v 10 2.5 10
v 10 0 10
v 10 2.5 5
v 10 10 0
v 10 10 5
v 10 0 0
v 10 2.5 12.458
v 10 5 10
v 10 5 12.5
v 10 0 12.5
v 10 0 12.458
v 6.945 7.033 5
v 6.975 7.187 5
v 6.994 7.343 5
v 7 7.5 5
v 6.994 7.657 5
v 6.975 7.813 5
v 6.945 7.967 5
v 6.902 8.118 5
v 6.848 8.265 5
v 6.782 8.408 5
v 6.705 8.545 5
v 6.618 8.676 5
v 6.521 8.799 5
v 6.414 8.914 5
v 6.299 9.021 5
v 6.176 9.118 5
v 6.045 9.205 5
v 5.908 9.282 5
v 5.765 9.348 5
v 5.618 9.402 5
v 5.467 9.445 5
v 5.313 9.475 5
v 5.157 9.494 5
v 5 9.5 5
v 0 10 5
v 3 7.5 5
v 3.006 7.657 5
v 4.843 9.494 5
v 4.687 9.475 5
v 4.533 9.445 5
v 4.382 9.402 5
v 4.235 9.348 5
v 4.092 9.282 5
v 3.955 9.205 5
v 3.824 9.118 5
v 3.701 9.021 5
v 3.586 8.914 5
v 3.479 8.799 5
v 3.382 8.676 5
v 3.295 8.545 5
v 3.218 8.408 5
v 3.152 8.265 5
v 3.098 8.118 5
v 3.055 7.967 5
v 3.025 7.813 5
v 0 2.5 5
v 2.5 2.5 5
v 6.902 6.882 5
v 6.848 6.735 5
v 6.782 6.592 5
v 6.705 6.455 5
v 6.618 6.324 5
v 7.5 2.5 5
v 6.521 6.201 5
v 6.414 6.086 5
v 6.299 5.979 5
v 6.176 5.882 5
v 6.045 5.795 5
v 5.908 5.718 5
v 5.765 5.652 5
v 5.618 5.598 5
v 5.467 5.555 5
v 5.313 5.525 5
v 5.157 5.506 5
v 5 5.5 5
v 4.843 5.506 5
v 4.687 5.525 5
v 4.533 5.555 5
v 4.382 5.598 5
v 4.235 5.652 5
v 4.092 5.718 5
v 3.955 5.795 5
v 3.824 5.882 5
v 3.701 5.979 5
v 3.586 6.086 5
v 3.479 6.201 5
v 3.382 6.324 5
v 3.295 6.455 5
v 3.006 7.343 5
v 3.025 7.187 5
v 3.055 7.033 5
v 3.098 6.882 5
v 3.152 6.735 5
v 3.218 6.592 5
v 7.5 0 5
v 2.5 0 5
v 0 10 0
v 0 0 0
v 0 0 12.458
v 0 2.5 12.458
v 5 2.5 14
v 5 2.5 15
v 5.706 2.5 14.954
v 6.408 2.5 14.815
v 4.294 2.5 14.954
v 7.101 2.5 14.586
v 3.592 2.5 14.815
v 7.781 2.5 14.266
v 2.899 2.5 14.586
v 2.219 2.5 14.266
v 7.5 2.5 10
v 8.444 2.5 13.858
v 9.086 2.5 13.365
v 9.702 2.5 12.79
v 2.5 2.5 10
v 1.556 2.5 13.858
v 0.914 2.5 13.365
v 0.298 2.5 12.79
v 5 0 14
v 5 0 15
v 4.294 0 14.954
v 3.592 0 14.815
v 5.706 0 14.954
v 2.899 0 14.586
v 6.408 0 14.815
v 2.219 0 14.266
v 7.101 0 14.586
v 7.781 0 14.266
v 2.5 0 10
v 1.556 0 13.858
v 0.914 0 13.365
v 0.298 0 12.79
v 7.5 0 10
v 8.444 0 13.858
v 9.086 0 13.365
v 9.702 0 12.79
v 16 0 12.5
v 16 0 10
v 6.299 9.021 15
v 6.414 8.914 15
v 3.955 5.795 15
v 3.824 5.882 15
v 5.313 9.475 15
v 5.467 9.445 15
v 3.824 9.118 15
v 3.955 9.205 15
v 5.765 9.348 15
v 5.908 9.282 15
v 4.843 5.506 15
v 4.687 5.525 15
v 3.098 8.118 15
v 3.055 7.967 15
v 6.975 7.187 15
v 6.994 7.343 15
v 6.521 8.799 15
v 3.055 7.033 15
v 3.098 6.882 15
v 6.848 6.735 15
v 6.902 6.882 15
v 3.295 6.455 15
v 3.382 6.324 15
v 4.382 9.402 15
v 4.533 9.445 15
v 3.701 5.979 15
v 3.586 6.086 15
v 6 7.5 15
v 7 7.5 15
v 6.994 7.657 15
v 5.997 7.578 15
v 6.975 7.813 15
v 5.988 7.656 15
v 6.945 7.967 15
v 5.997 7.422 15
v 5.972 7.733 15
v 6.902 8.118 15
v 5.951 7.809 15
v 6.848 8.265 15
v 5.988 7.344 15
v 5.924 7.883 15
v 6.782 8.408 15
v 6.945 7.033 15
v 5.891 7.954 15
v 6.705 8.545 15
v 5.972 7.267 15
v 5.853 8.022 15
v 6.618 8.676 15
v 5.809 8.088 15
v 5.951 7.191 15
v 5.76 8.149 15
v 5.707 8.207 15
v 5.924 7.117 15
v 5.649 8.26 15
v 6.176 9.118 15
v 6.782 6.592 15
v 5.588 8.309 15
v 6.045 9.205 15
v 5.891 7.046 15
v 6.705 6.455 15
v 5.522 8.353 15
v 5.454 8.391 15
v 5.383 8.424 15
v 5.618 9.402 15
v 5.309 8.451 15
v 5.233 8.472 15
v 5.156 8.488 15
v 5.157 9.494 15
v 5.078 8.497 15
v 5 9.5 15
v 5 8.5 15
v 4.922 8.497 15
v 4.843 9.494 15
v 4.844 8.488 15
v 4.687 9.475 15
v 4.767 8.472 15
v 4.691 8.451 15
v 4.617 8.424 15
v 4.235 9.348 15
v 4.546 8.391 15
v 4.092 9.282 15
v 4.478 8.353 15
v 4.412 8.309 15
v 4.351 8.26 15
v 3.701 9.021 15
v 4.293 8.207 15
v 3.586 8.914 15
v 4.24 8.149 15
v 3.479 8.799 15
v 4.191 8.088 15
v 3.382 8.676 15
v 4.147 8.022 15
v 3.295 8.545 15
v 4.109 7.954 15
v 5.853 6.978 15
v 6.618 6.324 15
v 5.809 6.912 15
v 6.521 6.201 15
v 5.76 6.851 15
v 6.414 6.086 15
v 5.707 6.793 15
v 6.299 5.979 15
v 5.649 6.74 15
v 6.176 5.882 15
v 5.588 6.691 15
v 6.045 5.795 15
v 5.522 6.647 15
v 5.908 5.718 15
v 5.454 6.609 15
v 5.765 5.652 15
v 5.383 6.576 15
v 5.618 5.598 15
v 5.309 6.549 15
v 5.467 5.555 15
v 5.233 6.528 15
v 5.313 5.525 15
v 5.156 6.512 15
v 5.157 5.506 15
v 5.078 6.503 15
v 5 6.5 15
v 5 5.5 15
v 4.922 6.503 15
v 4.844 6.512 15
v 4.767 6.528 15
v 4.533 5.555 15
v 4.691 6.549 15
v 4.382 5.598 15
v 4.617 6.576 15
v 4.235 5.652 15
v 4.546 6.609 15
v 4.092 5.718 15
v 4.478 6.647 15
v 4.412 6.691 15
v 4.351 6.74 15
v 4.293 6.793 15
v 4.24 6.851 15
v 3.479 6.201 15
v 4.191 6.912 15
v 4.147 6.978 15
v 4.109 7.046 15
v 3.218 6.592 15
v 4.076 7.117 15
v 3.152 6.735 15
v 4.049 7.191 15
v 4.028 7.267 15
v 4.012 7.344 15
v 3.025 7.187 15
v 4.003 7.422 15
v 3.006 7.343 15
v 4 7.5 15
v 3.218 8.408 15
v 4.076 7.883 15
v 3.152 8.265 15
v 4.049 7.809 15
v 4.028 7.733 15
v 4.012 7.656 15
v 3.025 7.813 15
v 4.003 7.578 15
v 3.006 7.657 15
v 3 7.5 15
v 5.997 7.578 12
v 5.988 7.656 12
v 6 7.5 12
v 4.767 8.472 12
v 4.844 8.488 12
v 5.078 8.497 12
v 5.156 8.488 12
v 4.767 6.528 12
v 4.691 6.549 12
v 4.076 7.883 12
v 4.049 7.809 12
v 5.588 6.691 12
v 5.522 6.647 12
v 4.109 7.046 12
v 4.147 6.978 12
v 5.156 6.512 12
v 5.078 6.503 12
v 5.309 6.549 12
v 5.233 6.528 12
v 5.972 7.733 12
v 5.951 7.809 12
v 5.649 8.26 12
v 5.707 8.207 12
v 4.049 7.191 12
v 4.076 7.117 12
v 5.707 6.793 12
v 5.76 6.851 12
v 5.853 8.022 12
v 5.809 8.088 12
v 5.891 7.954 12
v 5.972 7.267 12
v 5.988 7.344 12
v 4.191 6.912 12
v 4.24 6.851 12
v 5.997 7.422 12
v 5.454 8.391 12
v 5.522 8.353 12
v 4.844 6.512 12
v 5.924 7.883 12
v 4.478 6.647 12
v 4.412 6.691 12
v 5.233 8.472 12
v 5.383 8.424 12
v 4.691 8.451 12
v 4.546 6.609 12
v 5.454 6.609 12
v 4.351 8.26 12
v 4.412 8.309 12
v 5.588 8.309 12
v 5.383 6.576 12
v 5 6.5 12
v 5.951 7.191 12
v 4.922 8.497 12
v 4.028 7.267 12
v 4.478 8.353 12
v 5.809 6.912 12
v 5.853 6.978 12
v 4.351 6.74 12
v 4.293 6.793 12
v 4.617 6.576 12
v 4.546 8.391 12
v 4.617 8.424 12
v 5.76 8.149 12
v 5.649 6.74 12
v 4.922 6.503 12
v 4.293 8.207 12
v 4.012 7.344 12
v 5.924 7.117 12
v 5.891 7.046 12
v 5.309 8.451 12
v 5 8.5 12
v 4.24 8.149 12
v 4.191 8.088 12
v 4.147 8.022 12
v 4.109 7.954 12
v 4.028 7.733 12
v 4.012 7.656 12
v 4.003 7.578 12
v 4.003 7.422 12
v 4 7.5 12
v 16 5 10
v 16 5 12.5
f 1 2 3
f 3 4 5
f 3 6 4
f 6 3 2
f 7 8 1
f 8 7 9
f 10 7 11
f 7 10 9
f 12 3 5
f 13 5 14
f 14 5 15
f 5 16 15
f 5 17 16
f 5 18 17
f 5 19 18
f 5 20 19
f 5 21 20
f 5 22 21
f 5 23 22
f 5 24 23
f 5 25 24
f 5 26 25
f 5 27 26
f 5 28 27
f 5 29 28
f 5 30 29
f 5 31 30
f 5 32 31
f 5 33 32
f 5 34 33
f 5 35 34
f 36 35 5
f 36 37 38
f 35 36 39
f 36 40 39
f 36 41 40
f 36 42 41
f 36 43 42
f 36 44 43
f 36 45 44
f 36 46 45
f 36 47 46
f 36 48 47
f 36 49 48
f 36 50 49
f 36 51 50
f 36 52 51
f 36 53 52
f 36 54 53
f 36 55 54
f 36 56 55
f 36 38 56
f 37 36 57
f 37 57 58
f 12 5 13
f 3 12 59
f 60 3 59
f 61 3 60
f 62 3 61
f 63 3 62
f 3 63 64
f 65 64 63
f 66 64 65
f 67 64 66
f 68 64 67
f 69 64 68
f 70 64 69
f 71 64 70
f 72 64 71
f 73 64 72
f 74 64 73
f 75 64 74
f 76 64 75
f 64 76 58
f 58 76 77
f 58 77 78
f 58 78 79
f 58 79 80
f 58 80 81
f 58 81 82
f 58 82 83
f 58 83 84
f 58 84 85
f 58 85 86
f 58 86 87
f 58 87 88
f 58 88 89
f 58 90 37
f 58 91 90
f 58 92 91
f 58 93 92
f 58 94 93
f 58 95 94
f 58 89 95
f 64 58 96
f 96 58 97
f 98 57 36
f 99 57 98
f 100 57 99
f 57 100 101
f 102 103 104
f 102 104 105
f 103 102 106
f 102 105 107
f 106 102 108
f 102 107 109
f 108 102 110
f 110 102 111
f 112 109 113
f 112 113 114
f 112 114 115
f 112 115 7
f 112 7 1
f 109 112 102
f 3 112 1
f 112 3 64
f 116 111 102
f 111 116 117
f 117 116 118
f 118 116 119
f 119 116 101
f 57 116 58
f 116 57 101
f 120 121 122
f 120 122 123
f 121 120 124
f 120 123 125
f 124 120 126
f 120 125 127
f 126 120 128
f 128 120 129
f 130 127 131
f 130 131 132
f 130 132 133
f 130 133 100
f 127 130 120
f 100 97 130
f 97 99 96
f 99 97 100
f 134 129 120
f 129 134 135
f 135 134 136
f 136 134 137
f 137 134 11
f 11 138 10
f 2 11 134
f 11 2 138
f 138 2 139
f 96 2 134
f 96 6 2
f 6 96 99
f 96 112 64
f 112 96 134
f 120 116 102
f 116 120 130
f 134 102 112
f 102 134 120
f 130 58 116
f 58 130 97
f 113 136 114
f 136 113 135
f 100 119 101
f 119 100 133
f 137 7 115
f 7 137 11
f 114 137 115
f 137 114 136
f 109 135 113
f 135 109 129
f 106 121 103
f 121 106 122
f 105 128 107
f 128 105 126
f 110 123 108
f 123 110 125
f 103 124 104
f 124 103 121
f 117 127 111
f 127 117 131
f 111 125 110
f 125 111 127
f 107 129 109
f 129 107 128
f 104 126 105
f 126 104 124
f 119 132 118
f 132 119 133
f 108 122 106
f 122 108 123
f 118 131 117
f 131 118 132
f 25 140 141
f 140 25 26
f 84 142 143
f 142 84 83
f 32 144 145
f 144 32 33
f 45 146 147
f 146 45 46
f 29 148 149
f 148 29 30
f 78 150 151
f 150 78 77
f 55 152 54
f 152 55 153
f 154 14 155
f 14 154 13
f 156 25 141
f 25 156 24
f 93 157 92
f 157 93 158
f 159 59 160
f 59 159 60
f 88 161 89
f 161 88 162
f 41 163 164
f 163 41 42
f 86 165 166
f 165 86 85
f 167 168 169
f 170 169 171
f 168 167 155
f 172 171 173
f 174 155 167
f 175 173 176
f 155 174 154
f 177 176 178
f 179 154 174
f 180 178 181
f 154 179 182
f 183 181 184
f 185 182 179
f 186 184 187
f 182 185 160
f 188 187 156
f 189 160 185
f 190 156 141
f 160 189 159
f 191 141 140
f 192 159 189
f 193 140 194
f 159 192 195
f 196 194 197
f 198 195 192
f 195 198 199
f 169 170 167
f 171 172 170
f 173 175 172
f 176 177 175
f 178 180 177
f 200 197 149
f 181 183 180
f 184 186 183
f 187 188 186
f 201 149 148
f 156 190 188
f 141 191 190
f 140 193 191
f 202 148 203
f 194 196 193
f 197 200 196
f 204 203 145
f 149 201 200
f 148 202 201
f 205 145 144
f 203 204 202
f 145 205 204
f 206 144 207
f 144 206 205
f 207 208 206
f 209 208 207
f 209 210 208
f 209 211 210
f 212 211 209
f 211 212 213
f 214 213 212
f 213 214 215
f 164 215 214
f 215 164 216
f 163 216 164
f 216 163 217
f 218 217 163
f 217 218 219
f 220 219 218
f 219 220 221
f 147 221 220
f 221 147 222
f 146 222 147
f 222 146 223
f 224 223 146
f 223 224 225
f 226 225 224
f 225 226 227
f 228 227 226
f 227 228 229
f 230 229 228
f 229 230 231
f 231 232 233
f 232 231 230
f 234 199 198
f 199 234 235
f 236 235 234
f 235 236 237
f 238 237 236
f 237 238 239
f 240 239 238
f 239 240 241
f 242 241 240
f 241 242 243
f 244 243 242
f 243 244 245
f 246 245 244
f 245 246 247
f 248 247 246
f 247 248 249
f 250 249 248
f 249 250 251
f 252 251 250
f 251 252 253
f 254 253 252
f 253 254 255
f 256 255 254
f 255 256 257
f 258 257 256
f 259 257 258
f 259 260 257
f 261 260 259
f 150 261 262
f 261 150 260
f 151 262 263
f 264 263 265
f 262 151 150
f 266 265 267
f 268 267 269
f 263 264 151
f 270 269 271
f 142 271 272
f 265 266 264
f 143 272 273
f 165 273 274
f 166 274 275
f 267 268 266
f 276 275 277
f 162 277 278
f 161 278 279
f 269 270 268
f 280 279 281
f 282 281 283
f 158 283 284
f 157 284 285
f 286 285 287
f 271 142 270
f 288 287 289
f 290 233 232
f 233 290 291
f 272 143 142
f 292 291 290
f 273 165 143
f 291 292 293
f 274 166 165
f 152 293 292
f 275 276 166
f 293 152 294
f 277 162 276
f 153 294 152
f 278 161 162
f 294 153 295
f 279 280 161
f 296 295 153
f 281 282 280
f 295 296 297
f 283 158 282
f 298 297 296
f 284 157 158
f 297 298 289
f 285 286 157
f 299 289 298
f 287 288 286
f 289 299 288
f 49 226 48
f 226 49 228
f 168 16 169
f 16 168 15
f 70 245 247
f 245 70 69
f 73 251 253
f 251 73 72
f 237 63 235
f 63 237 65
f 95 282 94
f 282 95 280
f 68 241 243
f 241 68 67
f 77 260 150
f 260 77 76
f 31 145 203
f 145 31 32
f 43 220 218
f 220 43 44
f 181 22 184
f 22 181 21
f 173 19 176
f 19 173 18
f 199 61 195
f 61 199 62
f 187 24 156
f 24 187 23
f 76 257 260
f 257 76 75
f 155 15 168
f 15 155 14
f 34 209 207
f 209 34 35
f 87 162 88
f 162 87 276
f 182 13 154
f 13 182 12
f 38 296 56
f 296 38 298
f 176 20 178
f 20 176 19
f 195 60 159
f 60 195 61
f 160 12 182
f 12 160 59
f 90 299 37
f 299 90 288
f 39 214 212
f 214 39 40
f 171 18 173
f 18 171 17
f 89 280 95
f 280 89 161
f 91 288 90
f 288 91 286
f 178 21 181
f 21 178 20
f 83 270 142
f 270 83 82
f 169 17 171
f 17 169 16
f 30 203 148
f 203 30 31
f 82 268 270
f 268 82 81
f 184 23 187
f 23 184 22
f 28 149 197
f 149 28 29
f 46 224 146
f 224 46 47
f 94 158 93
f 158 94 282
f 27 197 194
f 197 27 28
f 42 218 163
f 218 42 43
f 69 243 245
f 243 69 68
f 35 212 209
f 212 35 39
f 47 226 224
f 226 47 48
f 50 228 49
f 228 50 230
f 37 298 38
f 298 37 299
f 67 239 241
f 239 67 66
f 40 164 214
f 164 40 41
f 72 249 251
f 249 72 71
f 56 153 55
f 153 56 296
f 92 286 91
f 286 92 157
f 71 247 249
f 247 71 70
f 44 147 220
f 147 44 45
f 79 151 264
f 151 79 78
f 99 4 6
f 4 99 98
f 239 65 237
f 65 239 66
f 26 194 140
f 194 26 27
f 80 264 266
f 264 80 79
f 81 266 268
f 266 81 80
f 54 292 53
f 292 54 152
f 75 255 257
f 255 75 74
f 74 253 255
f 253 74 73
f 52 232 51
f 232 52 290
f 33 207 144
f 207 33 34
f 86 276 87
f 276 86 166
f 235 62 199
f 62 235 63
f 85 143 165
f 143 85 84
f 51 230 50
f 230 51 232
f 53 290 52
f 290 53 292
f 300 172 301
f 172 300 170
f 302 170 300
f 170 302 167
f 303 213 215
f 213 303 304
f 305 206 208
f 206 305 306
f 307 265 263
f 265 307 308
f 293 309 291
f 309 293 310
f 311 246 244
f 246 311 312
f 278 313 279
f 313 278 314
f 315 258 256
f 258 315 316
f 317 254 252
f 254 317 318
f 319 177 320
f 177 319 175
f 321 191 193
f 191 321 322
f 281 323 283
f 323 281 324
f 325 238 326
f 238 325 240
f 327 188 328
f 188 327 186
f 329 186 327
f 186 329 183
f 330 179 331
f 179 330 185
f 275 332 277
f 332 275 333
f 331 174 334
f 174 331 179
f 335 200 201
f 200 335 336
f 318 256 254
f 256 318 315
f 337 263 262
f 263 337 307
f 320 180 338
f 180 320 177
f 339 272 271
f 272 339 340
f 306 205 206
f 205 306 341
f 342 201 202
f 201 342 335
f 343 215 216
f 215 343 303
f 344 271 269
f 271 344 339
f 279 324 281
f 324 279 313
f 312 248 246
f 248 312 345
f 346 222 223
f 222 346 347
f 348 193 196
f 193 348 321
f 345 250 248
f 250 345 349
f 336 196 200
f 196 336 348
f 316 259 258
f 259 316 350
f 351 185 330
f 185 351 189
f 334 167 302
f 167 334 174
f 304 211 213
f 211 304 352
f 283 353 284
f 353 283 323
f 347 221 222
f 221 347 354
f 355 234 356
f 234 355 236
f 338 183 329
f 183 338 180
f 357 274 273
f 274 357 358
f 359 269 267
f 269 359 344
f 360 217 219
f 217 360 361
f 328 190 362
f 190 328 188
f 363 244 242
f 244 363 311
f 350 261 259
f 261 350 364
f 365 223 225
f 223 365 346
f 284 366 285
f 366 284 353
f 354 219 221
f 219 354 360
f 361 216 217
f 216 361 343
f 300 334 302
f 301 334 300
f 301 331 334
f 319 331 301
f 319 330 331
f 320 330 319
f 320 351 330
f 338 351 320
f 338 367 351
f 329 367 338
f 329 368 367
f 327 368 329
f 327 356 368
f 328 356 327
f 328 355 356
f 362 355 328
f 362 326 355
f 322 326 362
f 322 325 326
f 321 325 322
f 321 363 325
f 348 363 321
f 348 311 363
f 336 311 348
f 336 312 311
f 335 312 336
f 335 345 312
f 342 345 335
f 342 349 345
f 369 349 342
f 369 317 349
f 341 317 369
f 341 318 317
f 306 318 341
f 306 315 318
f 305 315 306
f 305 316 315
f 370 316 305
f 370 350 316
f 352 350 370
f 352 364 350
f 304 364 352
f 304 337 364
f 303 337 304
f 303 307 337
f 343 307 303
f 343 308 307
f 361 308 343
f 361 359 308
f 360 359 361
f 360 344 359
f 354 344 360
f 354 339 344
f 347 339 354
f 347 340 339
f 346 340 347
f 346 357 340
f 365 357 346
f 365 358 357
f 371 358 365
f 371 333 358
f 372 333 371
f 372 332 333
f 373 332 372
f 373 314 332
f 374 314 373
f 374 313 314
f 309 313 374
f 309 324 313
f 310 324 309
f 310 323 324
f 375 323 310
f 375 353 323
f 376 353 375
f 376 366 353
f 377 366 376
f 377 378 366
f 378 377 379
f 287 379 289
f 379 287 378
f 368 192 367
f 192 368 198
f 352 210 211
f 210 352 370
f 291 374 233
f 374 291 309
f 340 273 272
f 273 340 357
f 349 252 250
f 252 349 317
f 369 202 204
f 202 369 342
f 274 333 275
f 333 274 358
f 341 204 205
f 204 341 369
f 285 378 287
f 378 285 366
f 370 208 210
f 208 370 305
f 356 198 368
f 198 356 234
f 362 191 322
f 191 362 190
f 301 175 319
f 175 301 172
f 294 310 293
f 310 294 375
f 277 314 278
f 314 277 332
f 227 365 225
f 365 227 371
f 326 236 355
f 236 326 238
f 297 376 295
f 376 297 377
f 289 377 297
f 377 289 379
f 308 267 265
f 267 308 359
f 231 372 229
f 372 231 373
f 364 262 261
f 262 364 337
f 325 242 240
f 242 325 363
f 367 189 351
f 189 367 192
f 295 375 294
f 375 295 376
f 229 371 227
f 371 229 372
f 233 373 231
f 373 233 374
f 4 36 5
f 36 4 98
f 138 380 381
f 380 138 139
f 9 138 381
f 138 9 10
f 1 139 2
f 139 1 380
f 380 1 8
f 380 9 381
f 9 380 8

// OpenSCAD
/* Here to help test & set up new printer(s) 
*/

$fn = 80;

S = 10;

cube(size=[S, S, S/2]);

intersection() {
    rotate([-90, 0, 0]) translate([S/2, 0, 0]) scale([0.6, 1, 1]) cylinder(h=20, d=S*3);
    difference() {
        translate([0, 0, S/2]) cube(size=[S, S/4, S]);
        translate([0, 10, S/2]) rotate([90, 0, 0]) linear_extrude(20)
            polygon([[S/4, 0], [S/4, S/2], [S/2, S-1], [3*S/4, S/2], [3*S/4, 0]]);
    }
}

translate([S, 0, S]) cube(size=[S * 0.6, S/2, S/4]);

translate([S/2, S * 0.75, 0]) {
    difference() {
        cylinder(h=S*1.5, d=S * 0.4);
        translate([0, 0, S*1.5 - 3.0])
            cylinder(h=10, d=2.0);
    }
}
